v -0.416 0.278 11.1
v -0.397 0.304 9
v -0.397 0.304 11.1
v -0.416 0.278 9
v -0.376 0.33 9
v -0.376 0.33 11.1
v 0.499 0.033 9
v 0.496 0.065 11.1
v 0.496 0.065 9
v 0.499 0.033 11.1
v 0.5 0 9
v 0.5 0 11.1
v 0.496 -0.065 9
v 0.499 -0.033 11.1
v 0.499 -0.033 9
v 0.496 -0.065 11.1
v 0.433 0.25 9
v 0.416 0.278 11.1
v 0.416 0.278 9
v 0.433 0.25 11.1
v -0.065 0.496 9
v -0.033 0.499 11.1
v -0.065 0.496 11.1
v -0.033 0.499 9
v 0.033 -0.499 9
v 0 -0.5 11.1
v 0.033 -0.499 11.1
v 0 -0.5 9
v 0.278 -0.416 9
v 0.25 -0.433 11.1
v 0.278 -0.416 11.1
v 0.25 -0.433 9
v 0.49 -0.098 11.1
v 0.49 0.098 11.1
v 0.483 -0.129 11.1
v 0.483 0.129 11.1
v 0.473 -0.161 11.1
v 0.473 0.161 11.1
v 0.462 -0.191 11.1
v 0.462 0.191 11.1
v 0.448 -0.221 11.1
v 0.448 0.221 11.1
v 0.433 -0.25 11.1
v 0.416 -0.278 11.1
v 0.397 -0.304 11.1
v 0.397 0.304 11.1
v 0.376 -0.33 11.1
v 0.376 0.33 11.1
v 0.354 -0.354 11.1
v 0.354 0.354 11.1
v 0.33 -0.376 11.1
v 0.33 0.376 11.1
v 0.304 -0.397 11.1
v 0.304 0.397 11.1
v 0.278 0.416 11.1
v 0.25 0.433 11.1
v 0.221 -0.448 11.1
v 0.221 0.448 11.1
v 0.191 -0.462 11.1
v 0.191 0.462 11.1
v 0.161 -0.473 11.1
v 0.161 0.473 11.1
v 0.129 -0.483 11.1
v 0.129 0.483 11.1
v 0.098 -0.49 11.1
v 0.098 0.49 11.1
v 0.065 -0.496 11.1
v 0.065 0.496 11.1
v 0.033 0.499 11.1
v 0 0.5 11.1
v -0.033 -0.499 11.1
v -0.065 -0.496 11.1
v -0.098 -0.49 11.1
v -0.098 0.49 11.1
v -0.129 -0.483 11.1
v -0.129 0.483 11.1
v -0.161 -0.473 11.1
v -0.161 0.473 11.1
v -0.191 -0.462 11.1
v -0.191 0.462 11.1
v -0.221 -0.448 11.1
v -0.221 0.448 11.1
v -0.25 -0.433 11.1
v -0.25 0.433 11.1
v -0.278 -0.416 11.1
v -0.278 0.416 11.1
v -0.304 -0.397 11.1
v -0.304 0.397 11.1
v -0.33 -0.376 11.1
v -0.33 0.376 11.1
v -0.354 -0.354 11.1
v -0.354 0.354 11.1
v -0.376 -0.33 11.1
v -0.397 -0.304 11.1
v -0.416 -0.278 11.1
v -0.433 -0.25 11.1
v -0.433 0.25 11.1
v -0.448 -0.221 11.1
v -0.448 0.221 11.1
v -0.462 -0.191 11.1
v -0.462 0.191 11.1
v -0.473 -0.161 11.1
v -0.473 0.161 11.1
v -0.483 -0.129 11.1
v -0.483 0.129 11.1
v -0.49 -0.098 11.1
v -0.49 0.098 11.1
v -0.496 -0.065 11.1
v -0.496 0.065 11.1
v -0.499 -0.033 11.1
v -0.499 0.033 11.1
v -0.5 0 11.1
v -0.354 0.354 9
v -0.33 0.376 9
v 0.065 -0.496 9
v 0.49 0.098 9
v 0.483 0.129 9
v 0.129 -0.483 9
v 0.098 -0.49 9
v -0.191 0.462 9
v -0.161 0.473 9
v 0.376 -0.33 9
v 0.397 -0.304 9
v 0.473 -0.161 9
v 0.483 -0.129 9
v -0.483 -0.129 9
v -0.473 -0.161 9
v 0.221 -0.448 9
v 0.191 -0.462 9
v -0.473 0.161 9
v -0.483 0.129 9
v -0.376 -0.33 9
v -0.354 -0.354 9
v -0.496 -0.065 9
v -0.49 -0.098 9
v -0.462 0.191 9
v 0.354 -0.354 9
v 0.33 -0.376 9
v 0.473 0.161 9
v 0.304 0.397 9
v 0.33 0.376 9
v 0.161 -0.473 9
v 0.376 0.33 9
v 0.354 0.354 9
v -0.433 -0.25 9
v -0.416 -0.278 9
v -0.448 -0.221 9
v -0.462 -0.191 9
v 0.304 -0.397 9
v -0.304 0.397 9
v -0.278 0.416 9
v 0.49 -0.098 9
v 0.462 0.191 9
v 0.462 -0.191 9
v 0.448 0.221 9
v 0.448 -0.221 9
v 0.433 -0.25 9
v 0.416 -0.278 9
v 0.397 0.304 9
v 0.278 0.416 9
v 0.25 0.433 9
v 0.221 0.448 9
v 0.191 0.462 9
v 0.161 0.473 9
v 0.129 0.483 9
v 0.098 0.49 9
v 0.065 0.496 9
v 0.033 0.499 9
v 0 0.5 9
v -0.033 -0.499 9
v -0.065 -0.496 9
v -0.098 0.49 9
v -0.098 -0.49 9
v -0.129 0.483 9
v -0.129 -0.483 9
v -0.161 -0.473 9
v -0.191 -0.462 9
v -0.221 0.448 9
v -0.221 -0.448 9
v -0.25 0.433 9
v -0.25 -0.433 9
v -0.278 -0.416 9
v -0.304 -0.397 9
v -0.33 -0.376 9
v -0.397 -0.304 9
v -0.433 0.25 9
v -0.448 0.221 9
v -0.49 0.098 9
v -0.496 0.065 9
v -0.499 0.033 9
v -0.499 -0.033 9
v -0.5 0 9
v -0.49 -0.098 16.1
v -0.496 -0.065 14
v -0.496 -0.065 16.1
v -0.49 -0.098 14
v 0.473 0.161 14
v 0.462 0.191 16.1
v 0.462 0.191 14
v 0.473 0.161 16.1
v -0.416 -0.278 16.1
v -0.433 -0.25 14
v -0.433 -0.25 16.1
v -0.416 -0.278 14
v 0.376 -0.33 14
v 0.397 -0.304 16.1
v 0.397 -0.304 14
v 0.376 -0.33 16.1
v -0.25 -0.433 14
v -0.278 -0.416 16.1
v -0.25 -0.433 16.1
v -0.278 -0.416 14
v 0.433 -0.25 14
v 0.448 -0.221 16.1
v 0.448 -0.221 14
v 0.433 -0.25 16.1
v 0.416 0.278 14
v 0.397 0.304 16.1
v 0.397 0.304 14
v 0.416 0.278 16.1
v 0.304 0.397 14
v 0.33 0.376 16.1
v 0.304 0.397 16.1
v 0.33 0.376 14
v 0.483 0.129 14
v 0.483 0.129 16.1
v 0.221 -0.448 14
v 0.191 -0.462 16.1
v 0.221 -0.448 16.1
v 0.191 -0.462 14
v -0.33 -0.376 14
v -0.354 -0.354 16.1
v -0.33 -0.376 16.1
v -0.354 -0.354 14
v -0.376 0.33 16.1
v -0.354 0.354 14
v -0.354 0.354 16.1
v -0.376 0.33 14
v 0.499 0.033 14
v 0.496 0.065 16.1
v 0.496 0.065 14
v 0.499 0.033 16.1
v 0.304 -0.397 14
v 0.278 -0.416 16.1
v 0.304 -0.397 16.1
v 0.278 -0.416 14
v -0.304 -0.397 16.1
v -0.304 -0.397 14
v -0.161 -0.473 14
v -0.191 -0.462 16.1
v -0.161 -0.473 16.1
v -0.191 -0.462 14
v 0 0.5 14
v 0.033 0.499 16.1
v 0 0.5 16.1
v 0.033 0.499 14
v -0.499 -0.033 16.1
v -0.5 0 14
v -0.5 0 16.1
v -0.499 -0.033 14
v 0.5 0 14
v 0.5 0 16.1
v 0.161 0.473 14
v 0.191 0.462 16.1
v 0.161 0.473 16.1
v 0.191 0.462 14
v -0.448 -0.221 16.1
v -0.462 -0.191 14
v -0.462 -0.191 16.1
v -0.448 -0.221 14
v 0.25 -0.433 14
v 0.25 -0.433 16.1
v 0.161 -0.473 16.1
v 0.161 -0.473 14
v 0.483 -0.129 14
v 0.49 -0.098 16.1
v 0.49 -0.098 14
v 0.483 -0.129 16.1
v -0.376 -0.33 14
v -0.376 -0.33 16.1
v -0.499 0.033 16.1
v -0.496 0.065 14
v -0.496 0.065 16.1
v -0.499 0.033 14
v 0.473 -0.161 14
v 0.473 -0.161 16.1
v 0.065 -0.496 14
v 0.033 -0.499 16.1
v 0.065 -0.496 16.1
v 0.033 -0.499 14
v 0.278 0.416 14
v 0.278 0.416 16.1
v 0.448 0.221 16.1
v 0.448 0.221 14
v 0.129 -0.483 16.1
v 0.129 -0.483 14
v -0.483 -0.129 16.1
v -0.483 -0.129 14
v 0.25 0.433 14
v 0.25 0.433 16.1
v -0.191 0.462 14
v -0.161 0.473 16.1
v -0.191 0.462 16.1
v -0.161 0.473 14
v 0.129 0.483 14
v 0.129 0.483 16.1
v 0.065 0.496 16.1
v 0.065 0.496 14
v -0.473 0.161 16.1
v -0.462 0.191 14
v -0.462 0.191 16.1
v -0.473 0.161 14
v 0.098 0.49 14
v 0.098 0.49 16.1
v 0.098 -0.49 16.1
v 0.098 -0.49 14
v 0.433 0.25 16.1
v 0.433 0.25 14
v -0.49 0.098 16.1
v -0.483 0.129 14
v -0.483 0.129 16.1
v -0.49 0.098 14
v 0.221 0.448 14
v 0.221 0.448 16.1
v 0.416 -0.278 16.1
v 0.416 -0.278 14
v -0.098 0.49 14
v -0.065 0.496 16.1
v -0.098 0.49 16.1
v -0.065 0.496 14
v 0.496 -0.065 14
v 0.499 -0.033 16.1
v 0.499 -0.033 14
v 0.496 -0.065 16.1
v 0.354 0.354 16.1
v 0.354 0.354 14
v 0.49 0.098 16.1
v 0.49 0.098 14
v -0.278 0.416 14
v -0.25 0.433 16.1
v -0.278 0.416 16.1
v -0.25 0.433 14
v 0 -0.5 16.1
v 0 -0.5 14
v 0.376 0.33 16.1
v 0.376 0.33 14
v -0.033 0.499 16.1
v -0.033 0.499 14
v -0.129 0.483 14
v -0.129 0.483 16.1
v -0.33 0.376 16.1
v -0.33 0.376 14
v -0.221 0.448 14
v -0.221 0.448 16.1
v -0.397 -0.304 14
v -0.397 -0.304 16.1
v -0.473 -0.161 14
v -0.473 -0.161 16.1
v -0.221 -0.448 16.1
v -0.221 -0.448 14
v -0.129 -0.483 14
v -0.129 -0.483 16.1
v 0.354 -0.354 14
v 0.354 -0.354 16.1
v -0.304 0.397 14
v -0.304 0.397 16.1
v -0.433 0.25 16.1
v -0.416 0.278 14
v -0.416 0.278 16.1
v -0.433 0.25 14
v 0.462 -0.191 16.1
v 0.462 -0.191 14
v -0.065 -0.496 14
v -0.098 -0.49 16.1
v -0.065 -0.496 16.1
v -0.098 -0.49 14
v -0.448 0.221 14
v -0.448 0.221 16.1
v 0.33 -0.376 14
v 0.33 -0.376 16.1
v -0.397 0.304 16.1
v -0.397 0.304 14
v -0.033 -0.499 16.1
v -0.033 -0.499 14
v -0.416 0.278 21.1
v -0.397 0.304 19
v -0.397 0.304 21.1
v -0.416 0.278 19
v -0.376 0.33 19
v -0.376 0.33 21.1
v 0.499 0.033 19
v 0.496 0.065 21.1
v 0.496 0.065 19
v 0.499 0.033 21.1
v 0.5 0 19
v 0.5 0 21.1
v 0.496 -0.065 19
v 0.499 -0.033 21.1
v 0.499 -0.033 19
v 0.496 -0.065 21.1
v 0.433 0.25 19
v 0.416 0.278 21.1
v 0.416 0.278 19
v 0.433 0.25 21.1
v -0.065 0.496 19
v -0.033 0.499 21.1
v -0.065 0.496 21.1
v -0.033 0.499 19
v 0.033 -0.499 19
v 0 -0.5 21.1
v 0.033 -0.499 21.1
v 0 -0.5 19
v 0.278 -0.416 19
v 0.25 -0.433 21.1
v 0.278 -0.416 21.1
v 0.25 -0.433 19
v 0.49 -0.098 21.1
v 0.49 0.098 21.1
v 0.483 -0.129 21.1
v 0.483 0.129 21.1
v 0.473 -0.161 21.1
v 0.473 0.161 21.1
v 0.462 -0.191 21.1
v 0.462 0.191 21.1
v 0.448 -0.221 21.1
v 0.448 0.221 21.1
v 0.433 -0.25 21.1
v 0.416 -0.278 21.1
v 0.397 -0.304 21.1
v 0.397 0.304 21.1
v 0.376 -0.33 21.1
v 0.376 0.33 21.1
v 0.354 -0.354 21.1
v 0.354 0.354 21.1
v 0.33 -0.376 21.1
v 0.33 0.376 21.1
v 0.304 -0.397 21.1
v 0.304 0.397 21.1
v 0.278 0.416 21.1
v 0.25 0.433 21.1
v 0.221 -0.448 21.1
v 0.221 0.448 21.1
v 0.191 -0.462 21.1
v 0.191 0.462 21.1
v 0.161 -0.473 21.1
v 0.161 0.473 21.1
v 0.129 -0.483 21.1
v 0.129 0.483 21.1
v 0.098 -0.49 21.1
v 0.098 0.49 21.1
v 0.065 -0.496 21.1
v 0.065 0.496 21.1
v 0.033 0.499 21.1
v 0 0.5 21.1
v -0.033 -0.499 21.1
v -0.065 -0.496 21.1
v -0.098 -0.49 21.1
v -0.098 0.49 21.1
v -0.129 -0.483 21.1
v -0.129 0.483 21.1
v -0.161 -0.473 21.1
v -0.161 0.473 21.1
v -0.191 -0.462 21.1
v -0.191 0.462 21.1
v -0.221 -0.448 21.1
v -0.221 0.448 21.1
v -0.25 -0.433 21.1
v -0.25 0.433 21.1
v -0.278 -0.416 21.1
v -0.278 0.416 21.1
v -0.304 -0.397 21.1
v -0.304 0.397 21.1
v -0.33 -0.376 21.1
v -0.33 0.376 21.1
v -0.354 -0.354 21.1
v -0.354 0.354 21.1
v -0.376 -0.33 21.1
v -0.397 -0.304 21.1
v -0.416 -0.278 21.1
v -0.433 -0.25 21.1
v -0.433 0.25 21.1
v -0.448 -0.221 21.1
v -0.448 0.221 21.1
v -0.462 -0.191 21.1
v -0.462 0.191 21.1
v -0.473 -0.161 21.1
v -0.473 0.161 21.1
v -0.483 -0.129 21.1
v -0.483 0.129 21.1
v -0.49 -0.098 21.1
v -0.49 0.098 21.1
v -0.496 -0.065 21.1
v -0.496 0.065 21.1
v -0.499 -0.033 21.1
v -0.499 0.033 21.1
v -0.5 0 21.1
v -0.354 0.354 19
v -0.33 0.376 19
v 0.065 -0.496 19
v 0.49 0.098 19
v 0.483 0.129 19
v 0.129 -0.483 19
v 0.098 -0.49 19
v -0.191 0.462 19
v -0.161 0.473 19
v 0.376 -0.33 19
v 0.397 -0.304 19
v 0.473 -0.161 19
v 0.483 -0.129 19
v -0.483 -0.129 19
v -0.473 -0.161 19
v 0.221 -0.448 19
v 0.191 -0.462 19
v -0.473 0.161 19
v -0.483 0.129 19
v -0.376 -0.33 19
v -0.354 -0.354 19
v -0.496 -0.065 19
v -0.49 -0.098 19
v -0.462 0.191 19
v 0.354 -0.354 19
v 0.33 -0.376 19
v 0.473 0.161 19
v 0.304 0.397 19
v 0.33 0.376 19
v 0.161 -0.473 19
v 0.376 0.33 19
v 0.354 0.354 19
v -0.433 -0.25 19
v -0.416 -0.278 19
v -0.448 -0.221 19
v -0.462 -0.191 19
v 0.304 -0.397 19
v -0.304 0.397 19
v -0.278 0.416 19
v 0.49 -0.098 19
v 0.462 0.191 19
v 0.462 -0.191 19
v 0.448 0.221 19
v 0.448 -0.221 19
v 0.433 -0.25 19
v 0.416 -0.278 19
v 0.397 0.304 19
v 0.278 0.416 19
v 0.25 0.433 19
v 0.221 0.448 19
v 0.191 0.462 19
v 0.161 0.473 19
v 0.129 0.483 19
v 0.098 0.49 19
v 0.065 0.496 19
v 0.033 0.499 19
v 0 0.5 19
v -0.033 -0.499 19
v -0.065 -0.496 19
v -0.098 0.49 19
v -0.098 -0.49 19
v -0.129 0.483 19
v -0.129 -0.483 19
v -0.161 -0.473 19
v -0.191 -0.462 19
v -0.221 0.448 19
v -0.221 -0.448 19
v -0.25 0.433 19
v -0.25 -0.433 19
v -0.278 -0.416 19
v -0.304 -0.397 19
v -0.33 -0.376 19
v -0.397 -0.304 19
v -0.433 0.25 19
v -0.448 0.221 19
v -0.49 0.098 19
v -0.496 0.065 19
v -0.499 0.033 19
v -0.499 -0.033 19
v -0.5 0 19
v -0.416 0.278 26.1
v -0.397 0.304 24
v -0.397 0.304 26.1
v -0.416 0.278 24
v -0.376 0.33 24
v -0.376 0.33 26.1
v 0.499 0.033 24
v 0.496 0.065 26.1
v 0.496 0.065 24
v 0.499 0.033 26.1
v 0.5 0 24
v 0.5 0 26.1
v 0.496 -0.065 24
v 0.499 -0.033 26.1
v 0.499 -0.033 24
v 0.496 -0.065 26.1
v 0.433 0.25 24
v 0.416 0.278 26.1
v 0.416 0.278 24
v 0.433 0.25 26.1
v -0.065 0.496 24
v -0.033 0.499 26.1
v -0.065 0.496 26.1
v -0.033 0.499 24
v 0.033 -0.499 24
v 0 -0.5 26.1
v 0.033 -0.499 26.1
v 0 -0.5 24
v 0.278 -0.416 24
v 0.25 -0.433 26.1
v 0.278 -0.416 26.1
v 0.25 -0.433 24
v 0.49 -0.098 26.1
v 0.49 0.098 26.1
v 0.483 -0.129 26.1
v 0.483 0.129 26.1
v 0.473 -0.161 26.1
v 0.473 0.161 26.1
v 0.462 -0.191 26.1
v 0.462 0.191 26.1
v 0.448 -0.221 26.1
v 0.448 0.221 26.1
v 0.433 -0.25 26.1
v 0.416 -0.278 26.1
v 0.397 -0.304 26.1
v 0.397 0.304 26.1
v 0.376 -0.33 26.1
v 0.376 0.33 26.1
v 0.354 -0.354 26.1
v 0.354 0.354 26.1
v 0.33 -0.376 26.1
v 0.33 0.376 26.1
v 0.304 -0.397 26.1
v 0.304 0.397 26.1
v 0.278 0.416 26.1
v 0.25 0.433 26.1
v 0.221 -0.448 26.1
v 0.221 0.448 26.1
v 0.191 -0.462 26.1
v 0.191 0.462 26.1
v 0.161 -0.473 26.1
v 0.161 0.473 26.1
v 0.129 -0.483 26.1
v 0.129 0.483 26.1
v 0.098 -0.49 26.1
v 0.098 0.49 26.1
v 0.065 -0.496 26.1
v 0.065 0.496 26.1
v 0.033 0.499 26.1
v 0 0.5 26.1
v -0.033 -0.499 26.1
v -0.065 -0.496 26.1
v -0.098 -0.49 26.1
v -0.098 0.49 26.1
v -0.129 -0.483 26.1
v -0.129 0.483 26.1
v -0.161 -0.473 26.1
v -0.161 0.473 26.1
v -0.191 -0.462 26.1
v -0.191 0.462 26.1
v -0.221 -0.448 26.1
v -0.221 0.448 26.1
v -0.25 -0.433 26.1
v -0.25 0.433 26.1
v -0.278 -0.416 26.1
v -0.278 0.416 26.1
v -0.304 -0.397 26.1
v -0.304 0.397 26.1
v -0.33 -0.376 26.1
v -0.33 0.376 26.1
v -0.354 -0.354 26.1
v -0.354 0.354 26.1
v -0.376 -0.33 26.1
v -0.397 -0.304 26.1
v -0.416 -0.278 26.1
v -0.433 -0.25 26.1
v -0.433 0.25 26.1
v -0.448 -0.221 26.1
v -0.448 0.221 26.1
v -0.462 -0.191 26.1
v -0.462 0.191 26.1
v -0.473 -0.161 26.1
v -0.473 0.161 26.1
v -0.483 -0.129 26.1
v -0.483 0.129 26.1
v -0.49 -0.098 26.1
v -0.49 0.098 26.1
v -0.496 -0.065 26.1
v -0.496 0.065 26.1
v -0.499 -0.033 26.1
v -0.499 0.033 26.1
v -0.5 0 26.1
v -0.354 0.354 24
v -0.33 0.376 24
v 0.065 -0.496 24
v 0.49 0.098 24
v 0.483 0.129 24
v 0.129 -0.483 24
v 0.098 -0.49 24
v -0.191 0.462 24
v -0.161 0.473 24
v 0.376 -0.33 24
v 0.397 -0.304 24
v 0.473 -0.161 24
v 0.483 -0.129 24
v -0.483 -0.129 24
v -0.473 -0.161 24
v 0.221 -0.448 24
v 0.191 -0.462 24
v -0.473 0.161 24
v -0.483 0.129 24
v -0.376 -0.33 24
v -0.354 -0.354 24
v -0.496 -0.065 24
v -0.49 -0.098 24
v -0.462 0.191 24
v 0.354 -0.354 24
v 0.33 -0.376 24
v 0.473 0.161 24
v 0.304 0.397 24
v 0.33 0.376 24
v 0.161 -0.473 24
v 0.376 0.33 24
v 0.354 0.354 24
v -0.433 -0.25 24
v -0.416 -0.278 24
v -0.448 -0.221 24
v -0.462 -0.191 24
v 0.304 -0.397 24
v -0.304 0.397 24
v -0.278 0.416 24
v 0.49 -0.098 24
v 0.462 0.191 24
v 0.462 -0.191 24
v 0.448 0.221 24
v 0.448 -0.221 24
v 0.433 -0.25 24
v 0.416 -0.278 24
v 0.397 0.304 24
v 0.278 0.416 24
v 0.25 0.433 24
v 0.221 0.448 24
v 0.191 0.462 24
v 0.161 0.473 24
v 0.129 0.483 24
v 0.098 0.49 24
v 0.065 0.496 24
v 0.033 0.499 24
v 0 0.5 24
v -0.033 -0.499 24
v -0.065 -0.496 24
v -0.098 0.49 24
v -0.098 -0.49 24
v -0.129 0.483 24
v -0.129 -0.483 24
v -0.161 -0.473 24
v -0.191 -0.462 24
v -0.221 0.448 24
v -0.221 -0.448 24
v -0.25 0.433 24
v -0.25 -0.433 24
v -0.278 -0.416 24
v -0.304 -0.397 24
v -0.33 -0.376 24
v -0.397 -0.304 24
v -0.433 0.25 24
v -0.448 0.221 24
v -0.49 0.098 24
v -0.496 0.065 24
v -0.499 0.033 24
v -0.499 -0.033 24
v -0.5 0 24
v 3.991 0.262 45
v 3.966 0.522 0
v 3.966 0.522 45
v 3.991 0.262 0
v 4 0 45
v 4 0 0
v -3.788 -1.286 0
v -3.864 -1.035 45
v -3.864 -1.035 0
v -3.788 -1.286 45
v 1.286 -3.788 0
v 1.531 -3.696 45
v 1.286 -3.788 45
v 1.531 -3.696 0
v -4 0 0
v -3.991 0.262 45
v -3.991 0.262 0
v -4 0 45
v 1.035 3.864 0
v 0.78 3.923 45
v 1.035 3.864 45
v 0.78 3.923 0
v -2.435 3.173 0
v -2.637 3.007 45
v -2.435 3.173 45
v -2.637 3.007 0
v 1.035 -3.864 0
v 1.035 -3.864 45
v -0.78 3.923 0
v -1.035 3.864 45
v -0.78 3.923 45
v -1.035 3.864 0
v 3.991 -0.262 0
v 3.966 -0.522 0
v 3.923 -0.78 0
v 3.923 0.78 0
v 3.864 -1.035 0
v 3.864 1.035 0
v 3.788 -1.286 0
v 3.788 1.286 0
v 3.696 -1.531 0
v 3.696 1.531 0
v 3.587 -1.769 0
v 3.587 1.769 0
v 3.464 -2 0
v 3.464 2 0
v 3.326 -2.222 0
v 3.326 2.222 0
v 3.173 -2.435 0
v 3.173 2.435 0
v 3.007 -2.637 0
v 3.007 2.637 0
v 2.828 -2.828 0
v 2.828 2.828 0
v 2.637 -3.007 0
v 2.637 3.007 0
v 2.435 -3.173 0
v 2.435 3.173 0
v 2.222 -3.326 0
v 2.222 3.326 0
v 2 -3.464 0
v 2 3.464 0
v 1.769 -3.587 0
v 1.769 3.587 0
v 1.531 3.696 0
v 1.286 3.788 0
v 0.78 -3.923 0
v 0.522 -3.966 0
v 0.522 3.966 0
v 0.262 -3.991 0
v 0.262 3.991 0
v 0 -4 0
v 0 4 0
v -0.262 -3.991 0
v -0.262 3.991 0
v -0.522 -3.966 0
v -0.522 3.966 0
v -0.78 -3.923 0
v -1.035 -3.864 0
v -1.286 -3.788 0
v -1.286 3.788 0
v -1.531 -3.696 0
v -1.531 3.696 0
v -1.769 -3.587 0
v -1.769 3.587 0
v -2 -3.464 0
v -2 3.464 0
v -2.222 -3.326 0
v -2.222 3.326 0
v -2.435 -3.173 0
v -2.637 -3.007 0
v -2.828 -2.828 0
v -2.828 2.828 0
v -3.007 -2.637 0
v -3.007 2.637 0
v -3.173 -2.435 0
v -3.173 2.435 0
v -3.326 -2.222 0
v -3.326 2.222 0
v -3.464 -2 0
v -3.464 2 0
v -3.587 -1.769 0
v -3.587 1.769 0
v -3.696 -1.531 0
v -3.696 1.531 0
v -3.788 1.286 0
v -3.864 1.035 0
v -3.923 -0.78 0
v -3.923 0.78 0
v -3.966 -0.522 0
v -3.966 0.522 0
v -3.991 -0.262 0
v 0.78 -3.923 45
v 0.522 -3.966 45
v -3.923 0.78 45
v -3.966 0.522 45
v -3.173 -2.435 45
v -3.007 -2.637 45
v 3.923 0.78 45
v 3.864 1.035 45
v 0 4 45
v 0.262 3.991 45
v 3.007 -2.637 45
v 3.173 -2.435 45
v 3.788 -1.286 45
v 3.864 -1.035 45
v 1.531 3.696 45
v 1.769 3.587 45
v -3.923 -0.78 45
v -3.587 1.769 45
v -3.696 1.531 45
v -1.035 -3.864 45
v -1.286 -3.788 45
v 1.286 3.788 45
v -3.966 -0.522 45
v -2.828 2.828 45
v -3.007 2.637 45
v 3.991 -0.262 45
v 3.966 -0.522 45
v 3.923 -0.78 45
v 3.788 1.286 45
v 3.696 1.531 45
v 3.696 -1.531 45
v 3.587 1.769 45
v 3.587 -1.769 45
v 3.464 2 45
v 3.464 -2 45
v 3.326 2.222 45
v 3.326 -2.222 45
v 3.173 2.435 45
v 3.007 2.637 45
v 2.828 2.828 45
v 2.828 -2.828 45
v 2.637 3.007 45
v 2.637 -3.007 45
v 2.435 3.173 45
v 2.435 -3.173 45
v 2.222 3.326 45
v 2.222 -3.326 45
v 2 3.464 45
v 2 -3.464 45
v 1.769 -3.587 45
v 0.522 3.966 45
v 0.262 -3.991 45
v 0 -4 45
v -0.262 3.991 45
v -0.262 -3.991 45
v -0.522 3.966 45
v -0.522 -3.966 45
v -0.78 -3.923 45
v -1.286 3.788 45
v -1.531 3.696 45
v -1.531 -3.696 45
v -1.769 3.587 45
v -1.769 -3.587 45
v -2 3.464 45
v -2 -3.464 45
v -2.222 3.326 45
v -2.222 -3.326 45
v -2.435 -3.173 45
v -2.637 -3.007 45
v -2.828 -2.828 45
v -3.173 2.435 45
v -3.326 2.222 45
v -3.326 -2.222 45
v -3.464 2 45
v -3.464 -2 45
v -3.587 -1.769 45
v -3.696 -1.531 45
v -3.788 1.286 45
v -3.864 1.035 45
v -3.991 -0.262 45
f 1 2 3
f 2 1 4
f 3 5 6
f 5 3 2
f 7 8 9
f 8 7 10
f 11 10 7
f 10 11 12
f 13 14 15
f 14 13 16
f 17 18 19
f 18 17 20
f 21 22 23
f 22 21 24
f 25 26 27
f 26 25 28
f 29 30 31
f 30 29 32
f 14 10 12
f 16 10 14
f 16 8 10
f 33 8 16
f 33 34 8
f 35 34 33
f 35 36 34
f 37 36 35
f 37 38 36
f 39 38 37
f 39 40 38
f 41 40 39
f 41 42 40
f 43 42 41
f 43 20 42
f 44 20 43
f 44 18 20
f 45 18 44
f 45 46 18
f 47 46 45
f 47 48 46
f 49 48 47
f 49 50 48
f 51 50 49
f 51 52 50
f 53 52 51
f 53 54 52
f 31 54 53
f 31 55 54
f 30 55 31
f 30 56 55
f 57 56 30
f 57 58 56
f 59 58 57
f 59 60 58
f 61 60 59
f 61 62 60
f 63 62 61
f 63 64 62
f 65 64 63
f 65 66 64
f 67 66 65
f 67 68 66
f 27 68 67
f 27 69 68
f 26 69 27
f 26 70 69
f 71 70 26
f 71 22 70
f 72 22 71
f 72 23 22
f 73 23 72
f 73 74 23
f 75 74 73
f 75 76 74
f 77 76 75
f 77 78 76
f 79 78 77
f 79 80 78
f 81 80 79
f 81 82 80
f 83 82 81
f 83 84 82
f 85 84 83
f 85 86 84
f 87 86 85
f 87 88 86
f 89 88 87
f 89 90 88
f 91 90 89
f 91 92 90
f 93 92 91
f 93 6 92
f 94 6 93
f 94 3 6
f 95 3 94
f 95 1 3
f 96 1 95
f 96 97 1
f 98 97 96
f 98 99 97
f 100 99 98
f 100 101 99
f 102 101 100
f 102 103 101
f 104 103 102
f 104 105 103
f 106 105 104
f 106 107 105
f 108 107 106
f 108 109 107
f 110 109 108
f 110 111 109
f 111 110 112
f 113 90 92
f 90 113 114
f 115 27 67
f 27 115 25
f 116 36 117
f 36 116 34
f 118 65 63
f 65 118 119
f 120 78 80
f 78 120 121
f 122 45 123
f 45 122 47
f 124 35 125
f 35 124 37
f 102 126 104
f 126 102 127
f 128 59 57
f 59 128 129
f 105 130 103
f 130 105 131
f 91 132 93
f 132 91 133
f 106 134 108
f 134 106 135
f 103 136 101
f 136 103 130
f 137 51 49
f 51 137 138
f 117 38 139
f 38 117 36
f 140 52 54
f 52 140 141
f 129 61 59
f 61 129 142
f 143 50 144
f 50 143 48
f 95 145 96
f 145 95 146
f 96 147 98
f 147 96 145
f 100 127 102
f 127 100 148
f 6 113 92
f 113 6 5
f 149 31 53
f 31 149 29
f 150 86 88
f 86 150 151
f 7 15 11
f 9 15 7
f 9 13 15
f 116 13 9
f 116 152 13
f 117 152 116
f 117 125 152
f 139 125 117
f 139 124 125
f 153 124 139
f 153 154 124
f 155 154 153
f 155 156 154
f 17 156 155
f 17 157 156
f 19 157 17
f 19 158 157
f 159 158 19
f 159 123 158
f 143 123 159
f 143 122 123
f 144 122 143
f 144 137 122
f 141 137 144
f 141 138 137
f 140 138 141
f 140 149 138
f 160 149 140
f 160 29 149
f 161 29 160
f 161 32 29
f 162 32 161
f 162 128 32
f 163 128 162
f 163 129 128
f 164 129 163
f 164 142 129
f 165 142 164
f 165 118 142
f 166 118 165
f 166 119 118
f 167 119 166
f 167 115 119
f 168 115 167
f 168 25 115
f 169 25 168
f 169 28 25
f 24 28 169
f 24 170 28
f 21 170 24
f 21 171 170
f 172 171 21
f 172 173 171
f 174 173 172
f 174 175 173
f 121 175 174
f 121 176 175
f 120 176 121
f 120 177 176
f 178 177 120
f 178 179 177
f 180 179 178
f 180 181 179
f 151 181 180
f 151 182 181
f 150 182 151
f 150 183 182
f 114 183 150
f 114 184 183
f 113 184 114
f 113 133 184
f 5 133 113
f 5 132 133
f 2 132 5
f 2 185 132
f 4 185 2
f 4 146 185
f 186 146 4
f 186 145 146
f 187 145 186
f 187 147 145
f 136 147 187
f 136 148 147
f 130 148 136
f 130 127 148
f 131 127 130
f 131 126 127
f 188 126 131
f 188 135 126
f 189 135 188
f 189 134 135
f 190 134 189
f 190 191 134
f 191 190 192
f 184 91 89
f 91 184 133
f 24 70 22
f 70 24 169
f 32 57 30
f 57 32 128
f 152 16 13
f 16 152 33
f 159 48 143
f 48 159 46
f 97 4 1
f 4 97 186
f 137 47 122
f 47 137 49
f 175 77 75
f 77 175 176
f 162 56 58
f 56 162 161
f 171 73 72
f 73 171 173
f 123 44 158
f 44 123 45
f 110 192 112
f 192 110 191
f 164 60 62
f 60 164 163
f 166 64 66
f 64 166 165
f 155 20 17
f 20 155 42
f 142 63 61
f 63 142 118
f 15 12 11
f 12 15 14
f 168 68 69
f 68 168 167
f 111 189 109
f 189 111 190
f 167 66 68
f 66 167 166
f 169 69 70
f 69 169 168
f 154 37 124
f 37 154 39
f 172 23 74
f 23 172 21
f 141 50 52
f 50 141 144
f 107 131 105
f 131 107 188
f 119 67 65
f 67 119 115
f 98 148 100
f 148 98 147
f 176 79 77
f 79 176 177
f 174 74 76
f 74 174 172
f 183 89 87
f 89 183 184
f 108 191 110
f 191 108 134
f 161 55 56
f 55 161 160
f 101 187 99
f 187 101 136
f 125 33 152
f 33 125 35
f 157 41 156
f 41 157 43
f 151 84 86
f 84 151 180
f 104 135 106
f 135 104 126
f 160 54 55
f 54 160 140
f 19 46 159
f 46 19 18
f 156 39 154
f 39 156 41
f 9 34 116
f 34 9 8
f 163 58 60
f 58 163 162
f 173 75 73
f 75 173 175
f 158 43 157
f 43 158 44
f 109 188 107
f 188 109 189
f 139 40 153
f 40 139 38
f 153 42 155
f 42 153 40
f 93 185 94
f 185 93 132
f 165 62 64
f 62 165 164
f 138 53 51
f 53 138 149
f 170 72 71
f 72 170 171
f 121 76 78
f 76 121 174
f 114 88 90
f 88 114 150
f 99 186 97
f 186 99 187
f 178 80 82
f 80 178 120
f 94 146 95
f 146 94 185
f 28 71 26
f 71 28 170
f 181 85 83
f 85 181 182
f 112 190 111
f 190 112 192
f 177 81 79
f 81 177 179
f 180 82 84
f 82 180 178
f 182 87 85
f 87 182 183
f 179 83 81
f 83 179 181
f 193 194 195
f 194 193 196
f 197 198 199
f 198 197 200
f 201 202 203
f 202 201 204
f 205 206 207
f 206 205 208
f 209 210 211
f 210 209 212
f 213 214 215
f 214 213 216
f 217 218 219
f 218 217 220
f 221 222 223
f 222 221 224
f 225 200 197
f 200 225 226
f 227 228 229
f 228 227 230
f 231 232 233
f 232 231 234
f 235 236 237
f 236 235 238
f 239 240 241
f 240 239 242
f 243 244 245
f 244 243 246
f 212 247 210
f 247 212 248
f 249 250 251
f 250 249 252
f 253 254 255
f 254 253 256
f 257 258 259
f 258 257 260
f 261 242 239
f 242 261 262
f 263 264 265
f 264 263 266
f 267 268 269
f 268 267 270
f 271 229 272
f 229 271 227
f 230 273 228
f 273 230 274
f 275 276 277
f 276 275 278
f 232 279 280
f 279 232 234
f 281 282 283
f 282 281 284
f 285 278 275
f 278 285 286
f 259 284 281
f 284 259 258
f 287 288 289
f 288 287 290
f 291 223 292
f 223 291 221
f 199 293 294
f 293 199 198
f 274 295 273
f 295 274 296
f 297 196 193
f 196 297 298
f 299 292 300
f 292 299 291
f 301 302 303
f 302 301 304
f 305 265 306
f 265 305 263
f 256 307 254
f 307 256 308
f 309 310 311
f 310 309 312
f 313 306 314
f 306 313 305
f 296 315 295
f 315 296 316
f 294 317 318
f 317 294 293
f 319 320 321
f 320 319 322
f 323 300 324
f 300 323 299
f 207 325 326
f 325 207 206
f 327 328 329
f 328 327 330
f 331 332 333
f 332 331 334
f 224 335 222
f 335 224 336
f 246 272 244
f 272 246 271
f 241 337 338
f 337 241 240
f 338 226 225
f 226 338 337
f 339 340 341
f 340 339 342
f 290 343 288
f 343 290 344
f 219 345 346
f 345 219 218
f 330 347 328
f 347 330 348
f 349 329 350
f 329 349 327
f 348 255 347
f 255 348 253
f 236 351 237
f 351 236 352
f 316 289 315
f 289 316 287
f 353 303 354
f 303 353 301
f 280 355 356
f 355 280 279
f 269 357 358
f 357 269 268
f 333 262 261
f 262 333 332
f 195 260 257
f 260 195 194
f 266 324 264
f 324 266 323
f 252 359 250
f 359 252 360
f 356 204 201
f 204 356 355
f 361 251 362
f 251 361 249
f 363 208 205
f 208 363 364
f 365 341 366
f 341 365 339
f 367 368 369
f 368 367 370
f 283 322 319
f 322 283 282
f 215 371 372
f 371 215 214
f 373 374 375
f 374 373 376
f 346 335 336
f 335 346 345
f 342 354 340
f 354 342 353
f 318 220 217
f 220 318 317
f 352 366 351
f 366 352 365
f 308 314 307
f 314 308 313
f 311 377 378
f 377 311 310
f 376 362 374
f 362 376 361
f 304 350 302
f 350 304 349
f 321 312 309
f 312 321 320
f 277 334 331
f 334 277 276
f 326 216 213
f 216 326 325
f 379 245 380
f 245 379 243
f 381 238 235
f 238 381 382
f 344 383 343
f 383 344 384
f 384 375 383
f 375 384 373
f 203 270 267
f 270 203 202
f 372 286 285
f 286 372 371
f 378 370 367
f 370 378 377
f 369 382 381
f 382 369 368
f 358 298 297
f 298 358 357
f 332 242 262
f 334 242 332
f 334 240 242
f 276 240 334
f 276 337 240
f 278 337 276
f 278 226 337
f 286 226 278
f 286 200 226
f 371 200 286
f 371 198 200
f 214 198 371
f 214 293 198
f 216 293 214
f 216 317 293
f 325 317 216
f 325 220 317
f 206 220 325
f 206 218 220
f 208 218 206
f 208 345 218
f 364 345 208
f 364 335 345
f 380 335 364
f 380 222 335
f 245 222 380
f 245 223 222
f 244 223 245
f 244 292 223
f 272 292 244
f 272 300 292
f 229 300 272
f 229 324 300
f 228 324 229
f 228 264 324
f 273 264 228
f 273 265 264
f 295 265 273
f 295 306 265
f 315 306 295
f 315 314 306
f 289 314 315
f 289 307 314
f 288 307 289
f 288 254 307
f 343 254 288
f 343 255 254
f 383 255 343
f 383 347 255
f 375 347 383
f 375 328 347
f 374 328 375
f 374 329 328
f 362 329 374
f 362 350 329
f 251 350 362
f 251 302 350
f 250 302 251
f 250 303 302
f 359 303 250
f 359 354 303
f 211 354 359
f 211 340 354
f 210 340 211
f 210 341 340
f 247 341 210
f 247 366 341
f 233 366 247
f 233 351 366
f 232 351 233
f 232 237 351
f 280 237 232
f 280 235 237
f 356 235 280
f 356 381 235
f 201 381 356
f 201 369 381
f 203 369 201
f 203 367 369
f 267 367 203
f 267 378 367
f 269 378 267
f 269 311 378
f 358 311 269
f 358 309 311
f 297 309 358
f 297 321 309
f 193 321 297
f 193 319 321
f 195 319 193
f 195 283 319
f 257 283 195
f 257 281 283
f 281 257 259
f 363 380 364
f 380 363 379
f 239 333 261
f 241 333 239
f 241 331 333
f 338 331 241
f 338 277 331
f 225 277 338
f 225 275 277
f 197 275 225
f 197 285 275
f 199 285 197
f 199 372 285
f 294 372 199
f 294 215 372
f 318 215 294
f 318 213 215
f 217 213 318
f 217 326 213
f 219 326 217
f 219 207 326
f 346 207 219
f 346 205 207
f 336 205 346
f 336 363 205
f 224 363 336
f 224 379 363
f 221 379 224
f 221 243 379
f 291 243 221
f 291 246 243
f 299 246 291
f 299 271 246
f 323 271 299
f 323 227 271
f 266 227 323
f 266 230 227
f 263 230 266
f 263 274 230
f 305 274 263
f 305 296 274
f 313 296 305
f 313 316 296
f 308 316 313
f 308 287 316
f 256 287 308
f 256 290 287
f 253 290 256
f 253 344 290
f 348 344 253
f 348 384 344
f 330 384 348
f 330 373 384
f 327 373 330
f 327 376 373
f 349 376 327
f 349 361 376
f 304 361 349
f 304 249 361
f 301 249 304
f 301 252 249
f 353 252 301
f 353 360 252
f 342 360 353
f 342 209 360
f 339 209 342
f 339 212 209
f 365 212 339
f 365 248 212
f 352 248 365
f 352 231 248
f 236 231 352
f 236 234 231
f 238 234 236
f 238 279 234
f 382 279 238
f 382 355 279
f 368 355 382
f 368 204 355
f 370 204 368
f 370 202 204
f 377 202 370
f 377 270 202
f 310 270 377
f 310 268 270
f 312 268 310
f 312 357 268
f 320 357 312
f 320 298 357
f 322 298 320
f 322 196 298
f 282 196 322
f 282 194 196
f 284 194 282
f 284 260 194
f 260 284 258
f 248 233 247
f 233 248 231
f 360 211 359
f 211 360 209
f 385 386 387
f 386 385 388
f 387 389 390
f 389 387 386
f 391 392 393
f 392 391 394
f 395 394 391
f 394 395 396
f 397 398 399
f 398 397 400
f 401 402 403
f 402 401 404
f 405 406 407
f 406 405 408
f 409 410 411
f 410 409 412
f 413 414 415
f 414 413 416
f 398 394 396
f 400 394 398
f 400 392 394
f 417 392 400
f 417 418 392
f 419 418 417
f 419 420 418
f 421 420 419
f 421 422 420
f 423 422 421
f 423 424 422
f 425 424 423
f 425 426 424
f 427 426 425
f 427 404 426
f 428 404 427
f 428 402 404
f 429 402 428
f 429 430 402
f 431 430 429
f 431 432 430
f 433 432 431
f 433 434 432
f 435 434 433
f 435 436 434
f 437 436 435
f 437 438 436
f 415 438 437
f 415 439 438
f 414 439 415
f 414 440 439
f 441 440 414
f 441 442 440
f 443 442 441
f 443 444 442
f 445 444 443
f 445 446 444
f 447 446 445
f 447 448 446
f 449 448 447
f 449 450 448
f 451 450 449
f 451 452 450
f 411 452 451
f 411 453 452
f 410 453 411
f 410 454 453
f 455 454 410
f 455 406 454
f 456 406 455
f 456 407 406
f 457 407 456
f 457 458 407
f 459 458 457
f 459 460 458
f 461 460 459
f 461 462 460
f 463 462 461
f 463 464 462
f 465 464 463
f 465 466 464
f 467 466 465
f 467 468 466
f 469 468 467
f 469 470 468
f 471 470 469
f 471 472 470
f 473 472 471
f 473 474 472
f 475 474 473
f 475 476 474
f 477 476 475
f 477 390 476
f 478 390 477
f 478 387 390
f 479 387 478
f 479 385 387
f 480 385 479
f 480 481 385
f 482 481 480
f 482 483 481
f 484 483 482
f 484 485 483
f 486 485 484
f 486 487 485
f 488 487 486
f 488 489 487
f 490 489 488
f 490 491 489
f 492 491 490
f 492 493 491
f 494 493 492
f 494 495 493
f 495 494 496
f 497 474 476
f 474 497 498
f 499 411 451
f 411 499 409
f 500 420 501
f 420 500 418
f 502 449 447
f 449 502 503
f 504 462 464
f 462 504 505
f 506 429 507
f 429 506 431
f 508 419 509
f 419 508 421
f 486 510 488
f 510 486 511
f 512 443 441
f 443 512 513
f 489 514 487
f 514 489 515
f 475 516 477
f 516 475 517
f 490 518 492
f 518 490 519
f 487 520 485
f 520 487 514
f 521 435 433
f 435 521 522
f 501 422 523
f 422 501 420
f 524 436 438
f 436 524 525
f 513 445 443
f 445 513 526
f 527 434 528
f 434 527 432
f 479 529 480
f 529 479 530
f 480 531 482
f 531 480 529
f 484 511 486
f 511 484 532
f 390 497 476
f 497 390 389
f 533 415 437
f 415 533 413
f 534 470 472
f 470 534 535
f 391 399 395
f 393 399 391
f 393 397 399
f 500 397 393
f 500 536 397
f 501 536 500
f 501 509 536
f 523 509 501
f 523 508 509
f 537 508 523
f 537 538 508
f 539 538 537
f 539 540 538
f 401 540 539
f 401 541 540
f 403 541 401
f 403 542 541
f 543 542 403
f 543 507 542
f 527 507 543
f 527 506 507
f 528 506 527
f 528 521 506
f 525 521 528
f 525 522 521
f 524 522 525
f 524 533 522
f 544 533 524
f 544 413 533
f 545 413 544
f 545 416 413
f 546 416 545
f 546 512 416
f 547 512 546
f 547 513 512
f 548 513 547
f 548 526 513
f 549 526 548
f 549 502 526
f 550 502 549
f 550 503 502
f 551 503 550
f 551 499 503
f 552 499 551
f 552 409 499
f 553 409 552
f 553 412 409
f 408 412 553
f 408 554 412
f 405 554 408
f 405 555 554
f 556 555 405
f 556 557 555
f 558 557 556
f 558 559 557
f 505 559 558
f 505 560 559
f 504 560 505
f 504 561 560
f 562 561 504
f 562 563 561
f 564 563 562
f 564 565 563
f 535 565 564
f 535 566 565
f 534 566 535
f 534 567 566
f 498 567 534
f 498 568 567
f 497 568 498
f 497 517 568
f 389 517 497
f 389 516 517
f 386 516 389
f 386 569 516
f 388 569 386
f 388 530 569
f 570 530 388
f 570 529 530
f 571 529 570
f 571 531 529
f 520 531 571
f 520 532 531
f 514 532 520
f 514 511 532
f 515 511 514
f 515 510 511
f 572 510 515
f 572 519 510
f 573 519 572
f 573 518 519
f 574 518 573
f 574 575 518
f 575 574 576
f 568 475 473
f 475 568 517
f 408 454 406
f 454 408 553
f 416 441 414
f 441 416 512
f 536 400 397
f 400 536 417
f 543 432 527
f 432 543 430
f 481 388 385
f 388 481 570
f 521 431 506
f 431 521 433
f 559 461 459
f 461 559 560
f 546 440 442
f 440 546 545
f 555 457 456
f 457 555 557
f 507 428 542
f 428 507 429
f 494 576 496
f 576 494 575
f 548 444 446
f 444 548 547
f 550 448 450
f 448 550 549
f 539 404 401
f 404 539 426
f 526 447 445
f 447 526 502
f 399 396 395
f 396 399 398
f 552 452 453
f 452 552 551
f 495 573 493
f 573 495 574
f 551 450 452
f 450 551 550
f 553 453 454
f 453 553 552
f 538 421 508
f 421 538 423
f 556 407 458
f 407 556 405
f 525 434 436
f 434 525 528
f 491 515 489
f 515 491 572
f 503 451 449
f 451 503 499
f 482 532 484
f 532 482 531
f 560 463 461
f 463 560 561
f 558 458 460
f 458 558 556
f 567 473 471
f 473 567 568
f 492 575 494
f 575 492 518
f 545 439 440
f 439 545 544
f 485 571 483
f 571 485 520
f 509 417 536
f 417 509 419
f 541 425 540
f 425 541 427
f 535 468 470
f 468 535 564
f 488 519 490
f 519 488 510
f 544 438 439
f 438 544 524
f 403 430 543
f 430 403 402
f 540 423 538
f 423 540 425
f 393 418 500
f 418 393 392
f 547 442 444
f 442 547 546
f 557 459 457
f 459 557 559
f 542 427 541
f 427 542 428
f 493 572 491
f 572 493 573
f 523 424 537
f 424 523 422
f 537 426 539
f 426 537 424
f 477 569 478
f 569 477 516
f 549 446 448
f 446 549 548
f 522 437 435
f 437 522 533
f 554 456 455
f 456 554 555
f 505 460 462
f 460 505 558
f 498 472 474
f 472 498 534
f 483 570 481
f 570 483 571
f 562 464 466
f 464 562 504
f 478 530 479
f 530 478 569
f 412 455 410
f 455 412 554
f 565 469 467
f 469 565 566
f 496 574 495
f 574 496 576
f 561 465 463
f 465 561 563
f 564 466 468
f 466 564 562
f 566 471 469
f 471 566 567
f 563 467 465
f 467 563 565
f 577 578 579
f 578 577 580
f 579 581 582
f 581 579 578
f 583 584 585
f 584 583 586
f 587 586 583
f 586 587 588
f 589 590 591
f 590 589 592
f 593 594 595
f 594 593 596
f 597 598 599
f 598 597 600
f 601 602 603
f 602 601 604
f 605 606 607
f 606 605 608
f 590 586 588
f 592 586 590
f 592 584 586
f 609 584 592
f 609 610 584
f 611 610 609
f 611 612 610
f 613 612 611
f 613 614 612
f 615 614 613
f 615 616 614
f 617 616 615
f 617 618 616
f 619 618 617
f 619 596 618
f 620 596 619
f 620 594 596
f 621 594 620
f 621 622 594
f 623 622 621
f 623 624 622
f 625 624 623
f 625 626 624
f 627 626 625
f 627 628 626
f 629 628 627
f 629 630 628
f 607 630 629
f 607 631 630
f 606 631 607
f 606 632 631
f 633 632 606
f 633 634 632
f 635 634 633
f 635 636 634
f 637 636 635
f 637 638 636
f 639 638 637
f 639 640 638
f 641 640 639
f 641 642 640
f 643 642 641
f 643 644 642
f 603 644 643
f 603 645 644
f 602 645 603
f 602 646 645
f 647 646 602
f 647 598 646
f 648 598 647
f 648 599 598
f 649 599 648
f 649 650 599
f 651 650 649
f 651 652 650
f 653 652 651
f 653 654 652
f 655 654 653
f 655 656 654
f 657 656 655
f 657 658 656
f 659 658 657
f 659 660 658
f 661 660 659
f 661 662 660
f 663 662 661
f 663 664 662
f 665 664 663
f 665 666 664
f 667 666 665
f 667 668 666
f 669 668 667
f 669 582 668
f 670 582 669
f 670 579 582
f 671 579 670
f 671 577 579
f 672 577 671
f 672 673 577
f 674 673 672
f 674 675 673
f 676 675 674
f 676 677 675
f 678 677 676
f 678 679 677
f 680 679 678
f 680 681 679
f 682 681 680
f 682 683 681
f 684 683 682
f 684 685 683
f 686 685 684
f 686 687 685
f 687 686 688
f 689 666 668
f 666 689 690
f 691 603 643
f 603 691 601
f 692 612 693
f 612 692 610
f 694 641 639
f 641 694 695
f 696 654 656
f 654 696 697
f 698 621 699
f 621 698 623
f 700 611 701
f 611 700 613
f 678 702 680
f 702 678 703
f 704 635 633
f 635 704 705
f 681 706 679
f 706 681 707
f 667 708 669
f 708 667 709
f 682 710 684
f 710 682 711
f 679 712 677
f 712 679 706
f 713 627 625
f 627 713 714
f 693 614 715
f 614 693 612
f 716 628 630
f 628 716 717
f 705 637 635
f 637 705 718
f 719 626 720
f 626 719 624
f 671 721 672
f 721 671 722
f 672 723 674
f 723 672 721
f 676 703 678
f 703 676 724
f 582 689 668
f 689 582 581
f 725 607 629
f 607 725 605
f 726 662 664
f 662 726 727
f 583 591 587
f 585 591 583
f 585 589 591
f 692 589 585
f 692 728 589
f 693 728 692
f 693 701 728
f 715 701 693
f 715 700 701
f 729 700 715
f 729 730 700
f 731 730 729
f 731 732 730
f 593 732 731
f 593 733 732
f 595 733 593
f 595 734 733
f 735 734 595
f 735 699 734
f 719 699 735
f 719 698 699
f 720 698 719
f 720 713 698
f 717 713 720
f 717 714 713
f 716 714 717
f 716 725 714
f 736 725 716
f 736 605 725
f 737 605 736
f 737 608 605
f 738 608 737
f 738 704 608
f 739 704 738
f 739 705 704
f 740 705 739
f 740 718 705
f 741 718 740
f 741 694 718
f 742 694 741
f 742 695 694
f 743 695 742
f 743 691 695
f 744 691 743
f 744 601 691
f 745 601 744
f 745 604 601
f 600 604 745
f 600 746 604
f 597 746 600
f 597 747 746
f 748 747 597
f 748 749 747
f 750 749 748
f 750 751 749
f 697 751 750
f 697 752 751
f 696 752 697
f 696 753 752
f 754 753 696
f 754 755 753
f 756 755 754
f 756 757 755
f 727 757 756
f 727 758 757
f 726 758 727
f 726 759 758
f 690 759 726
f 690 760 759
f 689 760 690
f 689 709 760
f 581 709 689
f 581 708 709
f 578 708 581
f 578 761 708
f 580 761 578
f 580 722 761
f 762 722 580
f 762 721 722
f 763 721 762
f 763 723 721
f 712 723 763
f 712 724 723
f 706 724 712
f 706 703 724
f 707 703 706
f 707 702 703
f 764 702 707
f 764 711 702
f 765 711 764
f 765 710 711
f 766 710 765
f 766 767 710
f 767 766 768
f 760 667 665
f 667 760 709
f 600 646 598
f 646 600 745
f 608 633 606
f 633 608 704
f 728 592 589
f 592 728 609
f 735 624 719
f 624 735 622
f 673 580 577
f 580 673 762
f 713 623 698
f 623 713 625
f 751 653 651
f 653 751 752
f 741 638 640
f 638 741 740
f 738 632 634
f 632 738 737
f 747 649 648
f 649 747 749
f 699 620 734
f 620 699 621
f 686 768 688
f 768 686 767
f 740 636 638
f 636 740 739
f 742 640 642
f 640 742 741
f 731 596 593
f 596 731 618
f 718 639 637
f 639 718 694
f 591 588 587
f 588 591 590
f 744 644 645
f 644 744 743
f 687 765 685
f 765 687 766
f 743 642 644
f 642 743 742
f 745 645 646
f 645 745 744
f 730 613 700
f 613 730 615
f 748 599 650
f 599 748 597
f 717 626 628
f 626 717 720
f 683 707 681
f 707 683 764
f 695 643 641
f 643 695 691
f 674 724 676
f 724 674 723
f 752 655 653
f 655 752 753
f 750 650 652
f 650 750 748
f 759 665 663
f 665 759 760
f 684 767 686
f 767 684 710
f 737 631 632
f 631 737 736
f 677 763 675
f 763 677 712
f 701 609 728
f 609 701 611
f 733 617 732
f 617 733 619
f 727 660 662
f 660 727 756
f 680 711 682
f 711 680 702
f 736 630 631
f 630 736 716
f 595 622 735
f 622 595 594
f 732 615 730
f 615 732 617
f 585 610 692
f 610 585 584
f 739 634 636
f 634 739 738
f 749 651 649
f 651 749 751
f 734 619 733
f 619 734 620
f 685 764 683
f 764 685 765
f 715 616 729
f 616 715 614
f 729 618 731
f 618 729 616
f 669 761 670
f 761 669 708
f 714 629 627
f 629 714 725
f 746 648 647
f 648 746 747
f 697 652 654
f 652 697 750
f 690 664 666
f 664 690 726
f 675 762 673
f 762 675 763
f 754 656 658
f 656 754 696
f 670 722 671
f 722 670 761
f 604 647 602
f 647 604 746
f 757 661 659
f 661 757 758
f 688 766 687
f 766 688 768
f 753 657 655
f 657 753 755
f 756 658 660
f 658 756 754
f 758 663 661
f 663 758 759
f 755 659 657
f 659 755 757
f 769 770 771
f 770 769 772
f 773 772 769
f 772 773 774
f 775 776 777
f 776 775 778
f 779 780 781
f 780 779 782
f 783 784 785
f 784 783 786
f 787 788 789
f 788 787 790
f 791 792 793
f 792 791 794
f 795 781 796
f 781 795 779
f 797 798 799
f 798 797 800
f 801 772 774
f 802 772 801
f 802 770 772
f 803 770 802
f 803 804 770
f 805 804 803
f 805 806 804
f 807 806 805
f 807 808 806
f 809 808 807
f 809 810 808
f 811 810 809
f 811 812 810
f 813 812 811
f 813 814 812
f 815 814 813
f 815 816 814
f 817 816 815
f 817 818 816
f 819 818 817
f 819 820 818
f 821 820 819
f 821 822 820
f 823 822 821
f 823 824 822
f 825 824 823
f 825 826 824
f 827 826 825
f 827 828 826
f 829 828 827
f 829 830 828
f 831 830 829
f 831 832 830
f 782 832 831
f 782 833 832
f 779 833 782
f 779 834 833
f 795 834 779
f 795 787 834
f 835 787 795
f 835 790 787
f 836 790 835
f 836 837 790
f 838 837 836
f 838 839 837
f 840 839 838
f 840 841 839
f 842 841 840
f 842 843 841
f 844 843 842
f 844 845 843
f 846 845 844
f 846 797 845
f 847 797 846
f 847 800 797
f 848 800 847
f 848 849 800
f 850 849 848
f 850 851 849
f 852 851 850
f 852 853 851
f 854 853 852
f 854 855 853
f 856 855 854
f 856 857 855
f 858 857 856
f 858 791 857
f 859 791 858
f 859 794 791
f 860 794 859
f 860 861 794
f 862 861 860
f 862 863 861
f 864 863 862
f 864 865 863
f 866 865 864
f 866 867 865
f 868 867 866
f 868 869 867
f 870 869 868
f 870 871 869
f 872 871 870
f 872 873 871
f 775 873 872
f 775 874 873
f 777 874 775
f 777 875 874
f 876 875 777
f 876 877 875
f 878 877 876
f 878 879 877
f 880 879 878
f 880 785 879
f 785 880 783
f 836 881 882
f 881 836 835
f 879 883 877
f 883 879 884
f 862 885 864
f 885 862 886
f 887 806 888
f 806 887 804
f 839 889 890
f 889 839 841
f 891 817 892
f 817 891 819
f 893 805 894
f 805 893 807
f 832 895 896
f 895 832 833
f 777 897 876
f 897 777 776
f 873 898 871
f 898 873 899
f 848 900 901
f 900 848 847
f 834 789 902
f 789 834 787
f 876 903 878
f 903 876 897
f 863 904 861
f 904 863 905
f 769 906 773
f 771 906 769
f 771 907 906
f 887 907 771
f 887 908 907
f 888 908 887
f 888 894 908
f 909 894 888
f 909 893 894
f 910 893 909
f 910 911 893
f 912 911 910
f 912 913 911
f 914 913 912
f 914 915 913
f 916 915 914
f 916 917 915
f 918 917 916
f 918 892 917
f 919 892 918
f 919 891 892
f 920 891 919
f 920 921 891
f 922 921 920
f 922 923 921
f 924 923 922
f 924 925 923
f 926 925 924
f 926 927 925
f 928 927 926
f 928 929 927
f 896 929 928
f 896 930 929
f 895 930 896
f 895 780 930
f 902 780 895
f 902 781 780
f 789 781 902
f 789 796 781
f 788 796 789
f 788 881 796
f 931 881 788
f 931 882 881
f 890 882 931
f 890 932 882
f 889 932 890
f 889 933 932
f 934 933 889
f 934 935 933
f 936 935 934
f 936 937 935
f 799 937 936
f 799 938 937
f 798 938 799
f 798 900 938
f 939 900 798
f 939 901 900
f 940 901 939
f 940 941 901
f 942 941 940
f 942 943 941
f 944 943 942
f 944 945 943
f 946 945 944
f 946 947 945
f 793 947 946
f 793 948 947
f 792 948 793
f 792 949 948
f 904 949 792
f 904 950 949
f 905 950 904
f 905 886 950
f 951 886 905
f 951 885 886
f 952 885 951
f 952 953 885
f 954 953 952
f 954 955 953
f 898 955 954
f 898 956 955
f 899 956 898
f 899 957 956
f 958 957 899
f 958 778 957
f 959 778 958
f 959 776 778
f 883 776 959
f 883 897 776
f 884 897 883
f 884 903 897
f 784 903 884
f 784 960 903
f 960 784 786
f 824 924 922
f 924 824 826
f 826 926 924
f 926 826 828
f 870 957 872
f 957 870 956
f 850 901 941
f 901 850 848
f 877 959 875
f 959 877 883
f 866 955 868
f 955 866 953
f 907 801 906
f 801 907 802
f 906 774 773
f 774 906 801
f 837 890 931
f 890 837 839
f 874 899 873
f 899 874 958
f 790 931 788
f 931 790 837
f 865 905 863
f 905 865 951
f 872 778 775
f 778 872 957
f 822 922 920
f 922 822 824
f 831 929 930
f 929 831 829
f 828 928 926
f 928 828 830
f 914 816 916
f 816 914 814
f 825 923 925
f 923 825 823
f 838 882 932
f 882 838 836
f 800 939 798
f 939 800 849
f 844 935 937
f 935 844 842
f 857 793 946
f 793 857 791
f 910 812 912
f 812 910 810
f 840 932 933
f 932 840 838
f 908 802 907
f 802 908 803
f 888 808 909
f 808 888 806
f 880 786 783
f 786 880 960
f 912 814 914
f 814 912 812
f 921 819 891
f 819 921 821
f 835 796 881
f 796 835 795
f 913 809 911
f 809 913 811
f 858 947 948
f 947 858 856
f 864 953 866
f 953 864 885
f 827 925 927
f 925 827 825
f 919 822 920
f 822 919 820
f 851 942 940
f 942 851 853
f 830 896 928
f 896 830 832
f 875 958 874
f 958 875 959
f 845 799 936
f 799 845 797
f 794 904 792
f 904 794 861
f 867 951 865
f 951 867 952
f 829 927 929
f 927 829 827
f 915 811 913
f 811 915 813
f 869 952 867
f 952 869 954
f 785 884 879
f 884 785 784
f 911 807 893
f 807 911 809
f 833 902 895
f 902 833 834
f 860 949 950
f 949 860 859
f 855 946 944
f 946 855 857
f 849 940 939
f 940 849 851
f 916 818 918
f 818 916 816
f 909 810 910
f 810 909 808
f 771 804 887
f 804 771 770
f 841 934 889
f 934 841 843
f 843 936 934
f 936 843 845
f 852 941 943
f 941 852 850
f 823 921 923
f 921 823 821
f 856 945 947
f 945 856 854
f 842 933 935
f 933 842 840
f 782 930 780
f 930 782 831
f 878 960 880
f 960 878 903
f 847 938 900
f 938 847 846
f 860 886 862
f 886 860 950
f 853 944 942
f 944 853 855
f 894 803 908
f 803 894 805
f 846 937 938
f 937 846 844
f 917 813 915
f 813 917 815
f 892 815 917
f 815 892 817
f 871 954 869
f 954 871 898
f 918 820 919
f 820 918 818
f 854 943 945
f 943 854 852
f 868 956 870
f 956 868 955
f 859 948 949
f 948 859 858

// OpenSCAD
// Pestle for 1.5 mL microcentrifuge tube - standing upright on XY plane.
// Dimensions in mm.

// Handle
h_dia  = 8;
h_len  = 45;

// Cone
c_d1   = 8;
c_d2   = 3;
c_len  = 17; // 62 - 45

// Tip
tip_d  = 3;
tip_z  = 62;

// Grooves
g_count = 4;
g_w     = 2; // width in Z
g_d     = 1; // depth
g_locs  = [10, 15, 20, 25]; // Z positions

$fn = 96;

difference() {
    // Positive Geometry
    // 1. Handle
    translate([0, 0, 0])
        cylinder(h = h_len, d = h_dia);
    
    // 2. Cone
    translate([0, 0, 45])
        cylinder(h = c_len, d1 = c_d1, d2 = c_d2);
    
    // 3. Tip (Sphere centered at z=62)
    translate([0, 0, tip_z])
        sphere(d = tip_d);
    
    // Negative Geometry (Grooves)
    // Cut into the handle section.
    // Extend slightly past the handle to ensure clean cut.
    for (z = g_locs) {
        translate([0, 0, z - g_w / 2])
            cylinder(h = g_w + 0.1, d = g_d);
    }
}
